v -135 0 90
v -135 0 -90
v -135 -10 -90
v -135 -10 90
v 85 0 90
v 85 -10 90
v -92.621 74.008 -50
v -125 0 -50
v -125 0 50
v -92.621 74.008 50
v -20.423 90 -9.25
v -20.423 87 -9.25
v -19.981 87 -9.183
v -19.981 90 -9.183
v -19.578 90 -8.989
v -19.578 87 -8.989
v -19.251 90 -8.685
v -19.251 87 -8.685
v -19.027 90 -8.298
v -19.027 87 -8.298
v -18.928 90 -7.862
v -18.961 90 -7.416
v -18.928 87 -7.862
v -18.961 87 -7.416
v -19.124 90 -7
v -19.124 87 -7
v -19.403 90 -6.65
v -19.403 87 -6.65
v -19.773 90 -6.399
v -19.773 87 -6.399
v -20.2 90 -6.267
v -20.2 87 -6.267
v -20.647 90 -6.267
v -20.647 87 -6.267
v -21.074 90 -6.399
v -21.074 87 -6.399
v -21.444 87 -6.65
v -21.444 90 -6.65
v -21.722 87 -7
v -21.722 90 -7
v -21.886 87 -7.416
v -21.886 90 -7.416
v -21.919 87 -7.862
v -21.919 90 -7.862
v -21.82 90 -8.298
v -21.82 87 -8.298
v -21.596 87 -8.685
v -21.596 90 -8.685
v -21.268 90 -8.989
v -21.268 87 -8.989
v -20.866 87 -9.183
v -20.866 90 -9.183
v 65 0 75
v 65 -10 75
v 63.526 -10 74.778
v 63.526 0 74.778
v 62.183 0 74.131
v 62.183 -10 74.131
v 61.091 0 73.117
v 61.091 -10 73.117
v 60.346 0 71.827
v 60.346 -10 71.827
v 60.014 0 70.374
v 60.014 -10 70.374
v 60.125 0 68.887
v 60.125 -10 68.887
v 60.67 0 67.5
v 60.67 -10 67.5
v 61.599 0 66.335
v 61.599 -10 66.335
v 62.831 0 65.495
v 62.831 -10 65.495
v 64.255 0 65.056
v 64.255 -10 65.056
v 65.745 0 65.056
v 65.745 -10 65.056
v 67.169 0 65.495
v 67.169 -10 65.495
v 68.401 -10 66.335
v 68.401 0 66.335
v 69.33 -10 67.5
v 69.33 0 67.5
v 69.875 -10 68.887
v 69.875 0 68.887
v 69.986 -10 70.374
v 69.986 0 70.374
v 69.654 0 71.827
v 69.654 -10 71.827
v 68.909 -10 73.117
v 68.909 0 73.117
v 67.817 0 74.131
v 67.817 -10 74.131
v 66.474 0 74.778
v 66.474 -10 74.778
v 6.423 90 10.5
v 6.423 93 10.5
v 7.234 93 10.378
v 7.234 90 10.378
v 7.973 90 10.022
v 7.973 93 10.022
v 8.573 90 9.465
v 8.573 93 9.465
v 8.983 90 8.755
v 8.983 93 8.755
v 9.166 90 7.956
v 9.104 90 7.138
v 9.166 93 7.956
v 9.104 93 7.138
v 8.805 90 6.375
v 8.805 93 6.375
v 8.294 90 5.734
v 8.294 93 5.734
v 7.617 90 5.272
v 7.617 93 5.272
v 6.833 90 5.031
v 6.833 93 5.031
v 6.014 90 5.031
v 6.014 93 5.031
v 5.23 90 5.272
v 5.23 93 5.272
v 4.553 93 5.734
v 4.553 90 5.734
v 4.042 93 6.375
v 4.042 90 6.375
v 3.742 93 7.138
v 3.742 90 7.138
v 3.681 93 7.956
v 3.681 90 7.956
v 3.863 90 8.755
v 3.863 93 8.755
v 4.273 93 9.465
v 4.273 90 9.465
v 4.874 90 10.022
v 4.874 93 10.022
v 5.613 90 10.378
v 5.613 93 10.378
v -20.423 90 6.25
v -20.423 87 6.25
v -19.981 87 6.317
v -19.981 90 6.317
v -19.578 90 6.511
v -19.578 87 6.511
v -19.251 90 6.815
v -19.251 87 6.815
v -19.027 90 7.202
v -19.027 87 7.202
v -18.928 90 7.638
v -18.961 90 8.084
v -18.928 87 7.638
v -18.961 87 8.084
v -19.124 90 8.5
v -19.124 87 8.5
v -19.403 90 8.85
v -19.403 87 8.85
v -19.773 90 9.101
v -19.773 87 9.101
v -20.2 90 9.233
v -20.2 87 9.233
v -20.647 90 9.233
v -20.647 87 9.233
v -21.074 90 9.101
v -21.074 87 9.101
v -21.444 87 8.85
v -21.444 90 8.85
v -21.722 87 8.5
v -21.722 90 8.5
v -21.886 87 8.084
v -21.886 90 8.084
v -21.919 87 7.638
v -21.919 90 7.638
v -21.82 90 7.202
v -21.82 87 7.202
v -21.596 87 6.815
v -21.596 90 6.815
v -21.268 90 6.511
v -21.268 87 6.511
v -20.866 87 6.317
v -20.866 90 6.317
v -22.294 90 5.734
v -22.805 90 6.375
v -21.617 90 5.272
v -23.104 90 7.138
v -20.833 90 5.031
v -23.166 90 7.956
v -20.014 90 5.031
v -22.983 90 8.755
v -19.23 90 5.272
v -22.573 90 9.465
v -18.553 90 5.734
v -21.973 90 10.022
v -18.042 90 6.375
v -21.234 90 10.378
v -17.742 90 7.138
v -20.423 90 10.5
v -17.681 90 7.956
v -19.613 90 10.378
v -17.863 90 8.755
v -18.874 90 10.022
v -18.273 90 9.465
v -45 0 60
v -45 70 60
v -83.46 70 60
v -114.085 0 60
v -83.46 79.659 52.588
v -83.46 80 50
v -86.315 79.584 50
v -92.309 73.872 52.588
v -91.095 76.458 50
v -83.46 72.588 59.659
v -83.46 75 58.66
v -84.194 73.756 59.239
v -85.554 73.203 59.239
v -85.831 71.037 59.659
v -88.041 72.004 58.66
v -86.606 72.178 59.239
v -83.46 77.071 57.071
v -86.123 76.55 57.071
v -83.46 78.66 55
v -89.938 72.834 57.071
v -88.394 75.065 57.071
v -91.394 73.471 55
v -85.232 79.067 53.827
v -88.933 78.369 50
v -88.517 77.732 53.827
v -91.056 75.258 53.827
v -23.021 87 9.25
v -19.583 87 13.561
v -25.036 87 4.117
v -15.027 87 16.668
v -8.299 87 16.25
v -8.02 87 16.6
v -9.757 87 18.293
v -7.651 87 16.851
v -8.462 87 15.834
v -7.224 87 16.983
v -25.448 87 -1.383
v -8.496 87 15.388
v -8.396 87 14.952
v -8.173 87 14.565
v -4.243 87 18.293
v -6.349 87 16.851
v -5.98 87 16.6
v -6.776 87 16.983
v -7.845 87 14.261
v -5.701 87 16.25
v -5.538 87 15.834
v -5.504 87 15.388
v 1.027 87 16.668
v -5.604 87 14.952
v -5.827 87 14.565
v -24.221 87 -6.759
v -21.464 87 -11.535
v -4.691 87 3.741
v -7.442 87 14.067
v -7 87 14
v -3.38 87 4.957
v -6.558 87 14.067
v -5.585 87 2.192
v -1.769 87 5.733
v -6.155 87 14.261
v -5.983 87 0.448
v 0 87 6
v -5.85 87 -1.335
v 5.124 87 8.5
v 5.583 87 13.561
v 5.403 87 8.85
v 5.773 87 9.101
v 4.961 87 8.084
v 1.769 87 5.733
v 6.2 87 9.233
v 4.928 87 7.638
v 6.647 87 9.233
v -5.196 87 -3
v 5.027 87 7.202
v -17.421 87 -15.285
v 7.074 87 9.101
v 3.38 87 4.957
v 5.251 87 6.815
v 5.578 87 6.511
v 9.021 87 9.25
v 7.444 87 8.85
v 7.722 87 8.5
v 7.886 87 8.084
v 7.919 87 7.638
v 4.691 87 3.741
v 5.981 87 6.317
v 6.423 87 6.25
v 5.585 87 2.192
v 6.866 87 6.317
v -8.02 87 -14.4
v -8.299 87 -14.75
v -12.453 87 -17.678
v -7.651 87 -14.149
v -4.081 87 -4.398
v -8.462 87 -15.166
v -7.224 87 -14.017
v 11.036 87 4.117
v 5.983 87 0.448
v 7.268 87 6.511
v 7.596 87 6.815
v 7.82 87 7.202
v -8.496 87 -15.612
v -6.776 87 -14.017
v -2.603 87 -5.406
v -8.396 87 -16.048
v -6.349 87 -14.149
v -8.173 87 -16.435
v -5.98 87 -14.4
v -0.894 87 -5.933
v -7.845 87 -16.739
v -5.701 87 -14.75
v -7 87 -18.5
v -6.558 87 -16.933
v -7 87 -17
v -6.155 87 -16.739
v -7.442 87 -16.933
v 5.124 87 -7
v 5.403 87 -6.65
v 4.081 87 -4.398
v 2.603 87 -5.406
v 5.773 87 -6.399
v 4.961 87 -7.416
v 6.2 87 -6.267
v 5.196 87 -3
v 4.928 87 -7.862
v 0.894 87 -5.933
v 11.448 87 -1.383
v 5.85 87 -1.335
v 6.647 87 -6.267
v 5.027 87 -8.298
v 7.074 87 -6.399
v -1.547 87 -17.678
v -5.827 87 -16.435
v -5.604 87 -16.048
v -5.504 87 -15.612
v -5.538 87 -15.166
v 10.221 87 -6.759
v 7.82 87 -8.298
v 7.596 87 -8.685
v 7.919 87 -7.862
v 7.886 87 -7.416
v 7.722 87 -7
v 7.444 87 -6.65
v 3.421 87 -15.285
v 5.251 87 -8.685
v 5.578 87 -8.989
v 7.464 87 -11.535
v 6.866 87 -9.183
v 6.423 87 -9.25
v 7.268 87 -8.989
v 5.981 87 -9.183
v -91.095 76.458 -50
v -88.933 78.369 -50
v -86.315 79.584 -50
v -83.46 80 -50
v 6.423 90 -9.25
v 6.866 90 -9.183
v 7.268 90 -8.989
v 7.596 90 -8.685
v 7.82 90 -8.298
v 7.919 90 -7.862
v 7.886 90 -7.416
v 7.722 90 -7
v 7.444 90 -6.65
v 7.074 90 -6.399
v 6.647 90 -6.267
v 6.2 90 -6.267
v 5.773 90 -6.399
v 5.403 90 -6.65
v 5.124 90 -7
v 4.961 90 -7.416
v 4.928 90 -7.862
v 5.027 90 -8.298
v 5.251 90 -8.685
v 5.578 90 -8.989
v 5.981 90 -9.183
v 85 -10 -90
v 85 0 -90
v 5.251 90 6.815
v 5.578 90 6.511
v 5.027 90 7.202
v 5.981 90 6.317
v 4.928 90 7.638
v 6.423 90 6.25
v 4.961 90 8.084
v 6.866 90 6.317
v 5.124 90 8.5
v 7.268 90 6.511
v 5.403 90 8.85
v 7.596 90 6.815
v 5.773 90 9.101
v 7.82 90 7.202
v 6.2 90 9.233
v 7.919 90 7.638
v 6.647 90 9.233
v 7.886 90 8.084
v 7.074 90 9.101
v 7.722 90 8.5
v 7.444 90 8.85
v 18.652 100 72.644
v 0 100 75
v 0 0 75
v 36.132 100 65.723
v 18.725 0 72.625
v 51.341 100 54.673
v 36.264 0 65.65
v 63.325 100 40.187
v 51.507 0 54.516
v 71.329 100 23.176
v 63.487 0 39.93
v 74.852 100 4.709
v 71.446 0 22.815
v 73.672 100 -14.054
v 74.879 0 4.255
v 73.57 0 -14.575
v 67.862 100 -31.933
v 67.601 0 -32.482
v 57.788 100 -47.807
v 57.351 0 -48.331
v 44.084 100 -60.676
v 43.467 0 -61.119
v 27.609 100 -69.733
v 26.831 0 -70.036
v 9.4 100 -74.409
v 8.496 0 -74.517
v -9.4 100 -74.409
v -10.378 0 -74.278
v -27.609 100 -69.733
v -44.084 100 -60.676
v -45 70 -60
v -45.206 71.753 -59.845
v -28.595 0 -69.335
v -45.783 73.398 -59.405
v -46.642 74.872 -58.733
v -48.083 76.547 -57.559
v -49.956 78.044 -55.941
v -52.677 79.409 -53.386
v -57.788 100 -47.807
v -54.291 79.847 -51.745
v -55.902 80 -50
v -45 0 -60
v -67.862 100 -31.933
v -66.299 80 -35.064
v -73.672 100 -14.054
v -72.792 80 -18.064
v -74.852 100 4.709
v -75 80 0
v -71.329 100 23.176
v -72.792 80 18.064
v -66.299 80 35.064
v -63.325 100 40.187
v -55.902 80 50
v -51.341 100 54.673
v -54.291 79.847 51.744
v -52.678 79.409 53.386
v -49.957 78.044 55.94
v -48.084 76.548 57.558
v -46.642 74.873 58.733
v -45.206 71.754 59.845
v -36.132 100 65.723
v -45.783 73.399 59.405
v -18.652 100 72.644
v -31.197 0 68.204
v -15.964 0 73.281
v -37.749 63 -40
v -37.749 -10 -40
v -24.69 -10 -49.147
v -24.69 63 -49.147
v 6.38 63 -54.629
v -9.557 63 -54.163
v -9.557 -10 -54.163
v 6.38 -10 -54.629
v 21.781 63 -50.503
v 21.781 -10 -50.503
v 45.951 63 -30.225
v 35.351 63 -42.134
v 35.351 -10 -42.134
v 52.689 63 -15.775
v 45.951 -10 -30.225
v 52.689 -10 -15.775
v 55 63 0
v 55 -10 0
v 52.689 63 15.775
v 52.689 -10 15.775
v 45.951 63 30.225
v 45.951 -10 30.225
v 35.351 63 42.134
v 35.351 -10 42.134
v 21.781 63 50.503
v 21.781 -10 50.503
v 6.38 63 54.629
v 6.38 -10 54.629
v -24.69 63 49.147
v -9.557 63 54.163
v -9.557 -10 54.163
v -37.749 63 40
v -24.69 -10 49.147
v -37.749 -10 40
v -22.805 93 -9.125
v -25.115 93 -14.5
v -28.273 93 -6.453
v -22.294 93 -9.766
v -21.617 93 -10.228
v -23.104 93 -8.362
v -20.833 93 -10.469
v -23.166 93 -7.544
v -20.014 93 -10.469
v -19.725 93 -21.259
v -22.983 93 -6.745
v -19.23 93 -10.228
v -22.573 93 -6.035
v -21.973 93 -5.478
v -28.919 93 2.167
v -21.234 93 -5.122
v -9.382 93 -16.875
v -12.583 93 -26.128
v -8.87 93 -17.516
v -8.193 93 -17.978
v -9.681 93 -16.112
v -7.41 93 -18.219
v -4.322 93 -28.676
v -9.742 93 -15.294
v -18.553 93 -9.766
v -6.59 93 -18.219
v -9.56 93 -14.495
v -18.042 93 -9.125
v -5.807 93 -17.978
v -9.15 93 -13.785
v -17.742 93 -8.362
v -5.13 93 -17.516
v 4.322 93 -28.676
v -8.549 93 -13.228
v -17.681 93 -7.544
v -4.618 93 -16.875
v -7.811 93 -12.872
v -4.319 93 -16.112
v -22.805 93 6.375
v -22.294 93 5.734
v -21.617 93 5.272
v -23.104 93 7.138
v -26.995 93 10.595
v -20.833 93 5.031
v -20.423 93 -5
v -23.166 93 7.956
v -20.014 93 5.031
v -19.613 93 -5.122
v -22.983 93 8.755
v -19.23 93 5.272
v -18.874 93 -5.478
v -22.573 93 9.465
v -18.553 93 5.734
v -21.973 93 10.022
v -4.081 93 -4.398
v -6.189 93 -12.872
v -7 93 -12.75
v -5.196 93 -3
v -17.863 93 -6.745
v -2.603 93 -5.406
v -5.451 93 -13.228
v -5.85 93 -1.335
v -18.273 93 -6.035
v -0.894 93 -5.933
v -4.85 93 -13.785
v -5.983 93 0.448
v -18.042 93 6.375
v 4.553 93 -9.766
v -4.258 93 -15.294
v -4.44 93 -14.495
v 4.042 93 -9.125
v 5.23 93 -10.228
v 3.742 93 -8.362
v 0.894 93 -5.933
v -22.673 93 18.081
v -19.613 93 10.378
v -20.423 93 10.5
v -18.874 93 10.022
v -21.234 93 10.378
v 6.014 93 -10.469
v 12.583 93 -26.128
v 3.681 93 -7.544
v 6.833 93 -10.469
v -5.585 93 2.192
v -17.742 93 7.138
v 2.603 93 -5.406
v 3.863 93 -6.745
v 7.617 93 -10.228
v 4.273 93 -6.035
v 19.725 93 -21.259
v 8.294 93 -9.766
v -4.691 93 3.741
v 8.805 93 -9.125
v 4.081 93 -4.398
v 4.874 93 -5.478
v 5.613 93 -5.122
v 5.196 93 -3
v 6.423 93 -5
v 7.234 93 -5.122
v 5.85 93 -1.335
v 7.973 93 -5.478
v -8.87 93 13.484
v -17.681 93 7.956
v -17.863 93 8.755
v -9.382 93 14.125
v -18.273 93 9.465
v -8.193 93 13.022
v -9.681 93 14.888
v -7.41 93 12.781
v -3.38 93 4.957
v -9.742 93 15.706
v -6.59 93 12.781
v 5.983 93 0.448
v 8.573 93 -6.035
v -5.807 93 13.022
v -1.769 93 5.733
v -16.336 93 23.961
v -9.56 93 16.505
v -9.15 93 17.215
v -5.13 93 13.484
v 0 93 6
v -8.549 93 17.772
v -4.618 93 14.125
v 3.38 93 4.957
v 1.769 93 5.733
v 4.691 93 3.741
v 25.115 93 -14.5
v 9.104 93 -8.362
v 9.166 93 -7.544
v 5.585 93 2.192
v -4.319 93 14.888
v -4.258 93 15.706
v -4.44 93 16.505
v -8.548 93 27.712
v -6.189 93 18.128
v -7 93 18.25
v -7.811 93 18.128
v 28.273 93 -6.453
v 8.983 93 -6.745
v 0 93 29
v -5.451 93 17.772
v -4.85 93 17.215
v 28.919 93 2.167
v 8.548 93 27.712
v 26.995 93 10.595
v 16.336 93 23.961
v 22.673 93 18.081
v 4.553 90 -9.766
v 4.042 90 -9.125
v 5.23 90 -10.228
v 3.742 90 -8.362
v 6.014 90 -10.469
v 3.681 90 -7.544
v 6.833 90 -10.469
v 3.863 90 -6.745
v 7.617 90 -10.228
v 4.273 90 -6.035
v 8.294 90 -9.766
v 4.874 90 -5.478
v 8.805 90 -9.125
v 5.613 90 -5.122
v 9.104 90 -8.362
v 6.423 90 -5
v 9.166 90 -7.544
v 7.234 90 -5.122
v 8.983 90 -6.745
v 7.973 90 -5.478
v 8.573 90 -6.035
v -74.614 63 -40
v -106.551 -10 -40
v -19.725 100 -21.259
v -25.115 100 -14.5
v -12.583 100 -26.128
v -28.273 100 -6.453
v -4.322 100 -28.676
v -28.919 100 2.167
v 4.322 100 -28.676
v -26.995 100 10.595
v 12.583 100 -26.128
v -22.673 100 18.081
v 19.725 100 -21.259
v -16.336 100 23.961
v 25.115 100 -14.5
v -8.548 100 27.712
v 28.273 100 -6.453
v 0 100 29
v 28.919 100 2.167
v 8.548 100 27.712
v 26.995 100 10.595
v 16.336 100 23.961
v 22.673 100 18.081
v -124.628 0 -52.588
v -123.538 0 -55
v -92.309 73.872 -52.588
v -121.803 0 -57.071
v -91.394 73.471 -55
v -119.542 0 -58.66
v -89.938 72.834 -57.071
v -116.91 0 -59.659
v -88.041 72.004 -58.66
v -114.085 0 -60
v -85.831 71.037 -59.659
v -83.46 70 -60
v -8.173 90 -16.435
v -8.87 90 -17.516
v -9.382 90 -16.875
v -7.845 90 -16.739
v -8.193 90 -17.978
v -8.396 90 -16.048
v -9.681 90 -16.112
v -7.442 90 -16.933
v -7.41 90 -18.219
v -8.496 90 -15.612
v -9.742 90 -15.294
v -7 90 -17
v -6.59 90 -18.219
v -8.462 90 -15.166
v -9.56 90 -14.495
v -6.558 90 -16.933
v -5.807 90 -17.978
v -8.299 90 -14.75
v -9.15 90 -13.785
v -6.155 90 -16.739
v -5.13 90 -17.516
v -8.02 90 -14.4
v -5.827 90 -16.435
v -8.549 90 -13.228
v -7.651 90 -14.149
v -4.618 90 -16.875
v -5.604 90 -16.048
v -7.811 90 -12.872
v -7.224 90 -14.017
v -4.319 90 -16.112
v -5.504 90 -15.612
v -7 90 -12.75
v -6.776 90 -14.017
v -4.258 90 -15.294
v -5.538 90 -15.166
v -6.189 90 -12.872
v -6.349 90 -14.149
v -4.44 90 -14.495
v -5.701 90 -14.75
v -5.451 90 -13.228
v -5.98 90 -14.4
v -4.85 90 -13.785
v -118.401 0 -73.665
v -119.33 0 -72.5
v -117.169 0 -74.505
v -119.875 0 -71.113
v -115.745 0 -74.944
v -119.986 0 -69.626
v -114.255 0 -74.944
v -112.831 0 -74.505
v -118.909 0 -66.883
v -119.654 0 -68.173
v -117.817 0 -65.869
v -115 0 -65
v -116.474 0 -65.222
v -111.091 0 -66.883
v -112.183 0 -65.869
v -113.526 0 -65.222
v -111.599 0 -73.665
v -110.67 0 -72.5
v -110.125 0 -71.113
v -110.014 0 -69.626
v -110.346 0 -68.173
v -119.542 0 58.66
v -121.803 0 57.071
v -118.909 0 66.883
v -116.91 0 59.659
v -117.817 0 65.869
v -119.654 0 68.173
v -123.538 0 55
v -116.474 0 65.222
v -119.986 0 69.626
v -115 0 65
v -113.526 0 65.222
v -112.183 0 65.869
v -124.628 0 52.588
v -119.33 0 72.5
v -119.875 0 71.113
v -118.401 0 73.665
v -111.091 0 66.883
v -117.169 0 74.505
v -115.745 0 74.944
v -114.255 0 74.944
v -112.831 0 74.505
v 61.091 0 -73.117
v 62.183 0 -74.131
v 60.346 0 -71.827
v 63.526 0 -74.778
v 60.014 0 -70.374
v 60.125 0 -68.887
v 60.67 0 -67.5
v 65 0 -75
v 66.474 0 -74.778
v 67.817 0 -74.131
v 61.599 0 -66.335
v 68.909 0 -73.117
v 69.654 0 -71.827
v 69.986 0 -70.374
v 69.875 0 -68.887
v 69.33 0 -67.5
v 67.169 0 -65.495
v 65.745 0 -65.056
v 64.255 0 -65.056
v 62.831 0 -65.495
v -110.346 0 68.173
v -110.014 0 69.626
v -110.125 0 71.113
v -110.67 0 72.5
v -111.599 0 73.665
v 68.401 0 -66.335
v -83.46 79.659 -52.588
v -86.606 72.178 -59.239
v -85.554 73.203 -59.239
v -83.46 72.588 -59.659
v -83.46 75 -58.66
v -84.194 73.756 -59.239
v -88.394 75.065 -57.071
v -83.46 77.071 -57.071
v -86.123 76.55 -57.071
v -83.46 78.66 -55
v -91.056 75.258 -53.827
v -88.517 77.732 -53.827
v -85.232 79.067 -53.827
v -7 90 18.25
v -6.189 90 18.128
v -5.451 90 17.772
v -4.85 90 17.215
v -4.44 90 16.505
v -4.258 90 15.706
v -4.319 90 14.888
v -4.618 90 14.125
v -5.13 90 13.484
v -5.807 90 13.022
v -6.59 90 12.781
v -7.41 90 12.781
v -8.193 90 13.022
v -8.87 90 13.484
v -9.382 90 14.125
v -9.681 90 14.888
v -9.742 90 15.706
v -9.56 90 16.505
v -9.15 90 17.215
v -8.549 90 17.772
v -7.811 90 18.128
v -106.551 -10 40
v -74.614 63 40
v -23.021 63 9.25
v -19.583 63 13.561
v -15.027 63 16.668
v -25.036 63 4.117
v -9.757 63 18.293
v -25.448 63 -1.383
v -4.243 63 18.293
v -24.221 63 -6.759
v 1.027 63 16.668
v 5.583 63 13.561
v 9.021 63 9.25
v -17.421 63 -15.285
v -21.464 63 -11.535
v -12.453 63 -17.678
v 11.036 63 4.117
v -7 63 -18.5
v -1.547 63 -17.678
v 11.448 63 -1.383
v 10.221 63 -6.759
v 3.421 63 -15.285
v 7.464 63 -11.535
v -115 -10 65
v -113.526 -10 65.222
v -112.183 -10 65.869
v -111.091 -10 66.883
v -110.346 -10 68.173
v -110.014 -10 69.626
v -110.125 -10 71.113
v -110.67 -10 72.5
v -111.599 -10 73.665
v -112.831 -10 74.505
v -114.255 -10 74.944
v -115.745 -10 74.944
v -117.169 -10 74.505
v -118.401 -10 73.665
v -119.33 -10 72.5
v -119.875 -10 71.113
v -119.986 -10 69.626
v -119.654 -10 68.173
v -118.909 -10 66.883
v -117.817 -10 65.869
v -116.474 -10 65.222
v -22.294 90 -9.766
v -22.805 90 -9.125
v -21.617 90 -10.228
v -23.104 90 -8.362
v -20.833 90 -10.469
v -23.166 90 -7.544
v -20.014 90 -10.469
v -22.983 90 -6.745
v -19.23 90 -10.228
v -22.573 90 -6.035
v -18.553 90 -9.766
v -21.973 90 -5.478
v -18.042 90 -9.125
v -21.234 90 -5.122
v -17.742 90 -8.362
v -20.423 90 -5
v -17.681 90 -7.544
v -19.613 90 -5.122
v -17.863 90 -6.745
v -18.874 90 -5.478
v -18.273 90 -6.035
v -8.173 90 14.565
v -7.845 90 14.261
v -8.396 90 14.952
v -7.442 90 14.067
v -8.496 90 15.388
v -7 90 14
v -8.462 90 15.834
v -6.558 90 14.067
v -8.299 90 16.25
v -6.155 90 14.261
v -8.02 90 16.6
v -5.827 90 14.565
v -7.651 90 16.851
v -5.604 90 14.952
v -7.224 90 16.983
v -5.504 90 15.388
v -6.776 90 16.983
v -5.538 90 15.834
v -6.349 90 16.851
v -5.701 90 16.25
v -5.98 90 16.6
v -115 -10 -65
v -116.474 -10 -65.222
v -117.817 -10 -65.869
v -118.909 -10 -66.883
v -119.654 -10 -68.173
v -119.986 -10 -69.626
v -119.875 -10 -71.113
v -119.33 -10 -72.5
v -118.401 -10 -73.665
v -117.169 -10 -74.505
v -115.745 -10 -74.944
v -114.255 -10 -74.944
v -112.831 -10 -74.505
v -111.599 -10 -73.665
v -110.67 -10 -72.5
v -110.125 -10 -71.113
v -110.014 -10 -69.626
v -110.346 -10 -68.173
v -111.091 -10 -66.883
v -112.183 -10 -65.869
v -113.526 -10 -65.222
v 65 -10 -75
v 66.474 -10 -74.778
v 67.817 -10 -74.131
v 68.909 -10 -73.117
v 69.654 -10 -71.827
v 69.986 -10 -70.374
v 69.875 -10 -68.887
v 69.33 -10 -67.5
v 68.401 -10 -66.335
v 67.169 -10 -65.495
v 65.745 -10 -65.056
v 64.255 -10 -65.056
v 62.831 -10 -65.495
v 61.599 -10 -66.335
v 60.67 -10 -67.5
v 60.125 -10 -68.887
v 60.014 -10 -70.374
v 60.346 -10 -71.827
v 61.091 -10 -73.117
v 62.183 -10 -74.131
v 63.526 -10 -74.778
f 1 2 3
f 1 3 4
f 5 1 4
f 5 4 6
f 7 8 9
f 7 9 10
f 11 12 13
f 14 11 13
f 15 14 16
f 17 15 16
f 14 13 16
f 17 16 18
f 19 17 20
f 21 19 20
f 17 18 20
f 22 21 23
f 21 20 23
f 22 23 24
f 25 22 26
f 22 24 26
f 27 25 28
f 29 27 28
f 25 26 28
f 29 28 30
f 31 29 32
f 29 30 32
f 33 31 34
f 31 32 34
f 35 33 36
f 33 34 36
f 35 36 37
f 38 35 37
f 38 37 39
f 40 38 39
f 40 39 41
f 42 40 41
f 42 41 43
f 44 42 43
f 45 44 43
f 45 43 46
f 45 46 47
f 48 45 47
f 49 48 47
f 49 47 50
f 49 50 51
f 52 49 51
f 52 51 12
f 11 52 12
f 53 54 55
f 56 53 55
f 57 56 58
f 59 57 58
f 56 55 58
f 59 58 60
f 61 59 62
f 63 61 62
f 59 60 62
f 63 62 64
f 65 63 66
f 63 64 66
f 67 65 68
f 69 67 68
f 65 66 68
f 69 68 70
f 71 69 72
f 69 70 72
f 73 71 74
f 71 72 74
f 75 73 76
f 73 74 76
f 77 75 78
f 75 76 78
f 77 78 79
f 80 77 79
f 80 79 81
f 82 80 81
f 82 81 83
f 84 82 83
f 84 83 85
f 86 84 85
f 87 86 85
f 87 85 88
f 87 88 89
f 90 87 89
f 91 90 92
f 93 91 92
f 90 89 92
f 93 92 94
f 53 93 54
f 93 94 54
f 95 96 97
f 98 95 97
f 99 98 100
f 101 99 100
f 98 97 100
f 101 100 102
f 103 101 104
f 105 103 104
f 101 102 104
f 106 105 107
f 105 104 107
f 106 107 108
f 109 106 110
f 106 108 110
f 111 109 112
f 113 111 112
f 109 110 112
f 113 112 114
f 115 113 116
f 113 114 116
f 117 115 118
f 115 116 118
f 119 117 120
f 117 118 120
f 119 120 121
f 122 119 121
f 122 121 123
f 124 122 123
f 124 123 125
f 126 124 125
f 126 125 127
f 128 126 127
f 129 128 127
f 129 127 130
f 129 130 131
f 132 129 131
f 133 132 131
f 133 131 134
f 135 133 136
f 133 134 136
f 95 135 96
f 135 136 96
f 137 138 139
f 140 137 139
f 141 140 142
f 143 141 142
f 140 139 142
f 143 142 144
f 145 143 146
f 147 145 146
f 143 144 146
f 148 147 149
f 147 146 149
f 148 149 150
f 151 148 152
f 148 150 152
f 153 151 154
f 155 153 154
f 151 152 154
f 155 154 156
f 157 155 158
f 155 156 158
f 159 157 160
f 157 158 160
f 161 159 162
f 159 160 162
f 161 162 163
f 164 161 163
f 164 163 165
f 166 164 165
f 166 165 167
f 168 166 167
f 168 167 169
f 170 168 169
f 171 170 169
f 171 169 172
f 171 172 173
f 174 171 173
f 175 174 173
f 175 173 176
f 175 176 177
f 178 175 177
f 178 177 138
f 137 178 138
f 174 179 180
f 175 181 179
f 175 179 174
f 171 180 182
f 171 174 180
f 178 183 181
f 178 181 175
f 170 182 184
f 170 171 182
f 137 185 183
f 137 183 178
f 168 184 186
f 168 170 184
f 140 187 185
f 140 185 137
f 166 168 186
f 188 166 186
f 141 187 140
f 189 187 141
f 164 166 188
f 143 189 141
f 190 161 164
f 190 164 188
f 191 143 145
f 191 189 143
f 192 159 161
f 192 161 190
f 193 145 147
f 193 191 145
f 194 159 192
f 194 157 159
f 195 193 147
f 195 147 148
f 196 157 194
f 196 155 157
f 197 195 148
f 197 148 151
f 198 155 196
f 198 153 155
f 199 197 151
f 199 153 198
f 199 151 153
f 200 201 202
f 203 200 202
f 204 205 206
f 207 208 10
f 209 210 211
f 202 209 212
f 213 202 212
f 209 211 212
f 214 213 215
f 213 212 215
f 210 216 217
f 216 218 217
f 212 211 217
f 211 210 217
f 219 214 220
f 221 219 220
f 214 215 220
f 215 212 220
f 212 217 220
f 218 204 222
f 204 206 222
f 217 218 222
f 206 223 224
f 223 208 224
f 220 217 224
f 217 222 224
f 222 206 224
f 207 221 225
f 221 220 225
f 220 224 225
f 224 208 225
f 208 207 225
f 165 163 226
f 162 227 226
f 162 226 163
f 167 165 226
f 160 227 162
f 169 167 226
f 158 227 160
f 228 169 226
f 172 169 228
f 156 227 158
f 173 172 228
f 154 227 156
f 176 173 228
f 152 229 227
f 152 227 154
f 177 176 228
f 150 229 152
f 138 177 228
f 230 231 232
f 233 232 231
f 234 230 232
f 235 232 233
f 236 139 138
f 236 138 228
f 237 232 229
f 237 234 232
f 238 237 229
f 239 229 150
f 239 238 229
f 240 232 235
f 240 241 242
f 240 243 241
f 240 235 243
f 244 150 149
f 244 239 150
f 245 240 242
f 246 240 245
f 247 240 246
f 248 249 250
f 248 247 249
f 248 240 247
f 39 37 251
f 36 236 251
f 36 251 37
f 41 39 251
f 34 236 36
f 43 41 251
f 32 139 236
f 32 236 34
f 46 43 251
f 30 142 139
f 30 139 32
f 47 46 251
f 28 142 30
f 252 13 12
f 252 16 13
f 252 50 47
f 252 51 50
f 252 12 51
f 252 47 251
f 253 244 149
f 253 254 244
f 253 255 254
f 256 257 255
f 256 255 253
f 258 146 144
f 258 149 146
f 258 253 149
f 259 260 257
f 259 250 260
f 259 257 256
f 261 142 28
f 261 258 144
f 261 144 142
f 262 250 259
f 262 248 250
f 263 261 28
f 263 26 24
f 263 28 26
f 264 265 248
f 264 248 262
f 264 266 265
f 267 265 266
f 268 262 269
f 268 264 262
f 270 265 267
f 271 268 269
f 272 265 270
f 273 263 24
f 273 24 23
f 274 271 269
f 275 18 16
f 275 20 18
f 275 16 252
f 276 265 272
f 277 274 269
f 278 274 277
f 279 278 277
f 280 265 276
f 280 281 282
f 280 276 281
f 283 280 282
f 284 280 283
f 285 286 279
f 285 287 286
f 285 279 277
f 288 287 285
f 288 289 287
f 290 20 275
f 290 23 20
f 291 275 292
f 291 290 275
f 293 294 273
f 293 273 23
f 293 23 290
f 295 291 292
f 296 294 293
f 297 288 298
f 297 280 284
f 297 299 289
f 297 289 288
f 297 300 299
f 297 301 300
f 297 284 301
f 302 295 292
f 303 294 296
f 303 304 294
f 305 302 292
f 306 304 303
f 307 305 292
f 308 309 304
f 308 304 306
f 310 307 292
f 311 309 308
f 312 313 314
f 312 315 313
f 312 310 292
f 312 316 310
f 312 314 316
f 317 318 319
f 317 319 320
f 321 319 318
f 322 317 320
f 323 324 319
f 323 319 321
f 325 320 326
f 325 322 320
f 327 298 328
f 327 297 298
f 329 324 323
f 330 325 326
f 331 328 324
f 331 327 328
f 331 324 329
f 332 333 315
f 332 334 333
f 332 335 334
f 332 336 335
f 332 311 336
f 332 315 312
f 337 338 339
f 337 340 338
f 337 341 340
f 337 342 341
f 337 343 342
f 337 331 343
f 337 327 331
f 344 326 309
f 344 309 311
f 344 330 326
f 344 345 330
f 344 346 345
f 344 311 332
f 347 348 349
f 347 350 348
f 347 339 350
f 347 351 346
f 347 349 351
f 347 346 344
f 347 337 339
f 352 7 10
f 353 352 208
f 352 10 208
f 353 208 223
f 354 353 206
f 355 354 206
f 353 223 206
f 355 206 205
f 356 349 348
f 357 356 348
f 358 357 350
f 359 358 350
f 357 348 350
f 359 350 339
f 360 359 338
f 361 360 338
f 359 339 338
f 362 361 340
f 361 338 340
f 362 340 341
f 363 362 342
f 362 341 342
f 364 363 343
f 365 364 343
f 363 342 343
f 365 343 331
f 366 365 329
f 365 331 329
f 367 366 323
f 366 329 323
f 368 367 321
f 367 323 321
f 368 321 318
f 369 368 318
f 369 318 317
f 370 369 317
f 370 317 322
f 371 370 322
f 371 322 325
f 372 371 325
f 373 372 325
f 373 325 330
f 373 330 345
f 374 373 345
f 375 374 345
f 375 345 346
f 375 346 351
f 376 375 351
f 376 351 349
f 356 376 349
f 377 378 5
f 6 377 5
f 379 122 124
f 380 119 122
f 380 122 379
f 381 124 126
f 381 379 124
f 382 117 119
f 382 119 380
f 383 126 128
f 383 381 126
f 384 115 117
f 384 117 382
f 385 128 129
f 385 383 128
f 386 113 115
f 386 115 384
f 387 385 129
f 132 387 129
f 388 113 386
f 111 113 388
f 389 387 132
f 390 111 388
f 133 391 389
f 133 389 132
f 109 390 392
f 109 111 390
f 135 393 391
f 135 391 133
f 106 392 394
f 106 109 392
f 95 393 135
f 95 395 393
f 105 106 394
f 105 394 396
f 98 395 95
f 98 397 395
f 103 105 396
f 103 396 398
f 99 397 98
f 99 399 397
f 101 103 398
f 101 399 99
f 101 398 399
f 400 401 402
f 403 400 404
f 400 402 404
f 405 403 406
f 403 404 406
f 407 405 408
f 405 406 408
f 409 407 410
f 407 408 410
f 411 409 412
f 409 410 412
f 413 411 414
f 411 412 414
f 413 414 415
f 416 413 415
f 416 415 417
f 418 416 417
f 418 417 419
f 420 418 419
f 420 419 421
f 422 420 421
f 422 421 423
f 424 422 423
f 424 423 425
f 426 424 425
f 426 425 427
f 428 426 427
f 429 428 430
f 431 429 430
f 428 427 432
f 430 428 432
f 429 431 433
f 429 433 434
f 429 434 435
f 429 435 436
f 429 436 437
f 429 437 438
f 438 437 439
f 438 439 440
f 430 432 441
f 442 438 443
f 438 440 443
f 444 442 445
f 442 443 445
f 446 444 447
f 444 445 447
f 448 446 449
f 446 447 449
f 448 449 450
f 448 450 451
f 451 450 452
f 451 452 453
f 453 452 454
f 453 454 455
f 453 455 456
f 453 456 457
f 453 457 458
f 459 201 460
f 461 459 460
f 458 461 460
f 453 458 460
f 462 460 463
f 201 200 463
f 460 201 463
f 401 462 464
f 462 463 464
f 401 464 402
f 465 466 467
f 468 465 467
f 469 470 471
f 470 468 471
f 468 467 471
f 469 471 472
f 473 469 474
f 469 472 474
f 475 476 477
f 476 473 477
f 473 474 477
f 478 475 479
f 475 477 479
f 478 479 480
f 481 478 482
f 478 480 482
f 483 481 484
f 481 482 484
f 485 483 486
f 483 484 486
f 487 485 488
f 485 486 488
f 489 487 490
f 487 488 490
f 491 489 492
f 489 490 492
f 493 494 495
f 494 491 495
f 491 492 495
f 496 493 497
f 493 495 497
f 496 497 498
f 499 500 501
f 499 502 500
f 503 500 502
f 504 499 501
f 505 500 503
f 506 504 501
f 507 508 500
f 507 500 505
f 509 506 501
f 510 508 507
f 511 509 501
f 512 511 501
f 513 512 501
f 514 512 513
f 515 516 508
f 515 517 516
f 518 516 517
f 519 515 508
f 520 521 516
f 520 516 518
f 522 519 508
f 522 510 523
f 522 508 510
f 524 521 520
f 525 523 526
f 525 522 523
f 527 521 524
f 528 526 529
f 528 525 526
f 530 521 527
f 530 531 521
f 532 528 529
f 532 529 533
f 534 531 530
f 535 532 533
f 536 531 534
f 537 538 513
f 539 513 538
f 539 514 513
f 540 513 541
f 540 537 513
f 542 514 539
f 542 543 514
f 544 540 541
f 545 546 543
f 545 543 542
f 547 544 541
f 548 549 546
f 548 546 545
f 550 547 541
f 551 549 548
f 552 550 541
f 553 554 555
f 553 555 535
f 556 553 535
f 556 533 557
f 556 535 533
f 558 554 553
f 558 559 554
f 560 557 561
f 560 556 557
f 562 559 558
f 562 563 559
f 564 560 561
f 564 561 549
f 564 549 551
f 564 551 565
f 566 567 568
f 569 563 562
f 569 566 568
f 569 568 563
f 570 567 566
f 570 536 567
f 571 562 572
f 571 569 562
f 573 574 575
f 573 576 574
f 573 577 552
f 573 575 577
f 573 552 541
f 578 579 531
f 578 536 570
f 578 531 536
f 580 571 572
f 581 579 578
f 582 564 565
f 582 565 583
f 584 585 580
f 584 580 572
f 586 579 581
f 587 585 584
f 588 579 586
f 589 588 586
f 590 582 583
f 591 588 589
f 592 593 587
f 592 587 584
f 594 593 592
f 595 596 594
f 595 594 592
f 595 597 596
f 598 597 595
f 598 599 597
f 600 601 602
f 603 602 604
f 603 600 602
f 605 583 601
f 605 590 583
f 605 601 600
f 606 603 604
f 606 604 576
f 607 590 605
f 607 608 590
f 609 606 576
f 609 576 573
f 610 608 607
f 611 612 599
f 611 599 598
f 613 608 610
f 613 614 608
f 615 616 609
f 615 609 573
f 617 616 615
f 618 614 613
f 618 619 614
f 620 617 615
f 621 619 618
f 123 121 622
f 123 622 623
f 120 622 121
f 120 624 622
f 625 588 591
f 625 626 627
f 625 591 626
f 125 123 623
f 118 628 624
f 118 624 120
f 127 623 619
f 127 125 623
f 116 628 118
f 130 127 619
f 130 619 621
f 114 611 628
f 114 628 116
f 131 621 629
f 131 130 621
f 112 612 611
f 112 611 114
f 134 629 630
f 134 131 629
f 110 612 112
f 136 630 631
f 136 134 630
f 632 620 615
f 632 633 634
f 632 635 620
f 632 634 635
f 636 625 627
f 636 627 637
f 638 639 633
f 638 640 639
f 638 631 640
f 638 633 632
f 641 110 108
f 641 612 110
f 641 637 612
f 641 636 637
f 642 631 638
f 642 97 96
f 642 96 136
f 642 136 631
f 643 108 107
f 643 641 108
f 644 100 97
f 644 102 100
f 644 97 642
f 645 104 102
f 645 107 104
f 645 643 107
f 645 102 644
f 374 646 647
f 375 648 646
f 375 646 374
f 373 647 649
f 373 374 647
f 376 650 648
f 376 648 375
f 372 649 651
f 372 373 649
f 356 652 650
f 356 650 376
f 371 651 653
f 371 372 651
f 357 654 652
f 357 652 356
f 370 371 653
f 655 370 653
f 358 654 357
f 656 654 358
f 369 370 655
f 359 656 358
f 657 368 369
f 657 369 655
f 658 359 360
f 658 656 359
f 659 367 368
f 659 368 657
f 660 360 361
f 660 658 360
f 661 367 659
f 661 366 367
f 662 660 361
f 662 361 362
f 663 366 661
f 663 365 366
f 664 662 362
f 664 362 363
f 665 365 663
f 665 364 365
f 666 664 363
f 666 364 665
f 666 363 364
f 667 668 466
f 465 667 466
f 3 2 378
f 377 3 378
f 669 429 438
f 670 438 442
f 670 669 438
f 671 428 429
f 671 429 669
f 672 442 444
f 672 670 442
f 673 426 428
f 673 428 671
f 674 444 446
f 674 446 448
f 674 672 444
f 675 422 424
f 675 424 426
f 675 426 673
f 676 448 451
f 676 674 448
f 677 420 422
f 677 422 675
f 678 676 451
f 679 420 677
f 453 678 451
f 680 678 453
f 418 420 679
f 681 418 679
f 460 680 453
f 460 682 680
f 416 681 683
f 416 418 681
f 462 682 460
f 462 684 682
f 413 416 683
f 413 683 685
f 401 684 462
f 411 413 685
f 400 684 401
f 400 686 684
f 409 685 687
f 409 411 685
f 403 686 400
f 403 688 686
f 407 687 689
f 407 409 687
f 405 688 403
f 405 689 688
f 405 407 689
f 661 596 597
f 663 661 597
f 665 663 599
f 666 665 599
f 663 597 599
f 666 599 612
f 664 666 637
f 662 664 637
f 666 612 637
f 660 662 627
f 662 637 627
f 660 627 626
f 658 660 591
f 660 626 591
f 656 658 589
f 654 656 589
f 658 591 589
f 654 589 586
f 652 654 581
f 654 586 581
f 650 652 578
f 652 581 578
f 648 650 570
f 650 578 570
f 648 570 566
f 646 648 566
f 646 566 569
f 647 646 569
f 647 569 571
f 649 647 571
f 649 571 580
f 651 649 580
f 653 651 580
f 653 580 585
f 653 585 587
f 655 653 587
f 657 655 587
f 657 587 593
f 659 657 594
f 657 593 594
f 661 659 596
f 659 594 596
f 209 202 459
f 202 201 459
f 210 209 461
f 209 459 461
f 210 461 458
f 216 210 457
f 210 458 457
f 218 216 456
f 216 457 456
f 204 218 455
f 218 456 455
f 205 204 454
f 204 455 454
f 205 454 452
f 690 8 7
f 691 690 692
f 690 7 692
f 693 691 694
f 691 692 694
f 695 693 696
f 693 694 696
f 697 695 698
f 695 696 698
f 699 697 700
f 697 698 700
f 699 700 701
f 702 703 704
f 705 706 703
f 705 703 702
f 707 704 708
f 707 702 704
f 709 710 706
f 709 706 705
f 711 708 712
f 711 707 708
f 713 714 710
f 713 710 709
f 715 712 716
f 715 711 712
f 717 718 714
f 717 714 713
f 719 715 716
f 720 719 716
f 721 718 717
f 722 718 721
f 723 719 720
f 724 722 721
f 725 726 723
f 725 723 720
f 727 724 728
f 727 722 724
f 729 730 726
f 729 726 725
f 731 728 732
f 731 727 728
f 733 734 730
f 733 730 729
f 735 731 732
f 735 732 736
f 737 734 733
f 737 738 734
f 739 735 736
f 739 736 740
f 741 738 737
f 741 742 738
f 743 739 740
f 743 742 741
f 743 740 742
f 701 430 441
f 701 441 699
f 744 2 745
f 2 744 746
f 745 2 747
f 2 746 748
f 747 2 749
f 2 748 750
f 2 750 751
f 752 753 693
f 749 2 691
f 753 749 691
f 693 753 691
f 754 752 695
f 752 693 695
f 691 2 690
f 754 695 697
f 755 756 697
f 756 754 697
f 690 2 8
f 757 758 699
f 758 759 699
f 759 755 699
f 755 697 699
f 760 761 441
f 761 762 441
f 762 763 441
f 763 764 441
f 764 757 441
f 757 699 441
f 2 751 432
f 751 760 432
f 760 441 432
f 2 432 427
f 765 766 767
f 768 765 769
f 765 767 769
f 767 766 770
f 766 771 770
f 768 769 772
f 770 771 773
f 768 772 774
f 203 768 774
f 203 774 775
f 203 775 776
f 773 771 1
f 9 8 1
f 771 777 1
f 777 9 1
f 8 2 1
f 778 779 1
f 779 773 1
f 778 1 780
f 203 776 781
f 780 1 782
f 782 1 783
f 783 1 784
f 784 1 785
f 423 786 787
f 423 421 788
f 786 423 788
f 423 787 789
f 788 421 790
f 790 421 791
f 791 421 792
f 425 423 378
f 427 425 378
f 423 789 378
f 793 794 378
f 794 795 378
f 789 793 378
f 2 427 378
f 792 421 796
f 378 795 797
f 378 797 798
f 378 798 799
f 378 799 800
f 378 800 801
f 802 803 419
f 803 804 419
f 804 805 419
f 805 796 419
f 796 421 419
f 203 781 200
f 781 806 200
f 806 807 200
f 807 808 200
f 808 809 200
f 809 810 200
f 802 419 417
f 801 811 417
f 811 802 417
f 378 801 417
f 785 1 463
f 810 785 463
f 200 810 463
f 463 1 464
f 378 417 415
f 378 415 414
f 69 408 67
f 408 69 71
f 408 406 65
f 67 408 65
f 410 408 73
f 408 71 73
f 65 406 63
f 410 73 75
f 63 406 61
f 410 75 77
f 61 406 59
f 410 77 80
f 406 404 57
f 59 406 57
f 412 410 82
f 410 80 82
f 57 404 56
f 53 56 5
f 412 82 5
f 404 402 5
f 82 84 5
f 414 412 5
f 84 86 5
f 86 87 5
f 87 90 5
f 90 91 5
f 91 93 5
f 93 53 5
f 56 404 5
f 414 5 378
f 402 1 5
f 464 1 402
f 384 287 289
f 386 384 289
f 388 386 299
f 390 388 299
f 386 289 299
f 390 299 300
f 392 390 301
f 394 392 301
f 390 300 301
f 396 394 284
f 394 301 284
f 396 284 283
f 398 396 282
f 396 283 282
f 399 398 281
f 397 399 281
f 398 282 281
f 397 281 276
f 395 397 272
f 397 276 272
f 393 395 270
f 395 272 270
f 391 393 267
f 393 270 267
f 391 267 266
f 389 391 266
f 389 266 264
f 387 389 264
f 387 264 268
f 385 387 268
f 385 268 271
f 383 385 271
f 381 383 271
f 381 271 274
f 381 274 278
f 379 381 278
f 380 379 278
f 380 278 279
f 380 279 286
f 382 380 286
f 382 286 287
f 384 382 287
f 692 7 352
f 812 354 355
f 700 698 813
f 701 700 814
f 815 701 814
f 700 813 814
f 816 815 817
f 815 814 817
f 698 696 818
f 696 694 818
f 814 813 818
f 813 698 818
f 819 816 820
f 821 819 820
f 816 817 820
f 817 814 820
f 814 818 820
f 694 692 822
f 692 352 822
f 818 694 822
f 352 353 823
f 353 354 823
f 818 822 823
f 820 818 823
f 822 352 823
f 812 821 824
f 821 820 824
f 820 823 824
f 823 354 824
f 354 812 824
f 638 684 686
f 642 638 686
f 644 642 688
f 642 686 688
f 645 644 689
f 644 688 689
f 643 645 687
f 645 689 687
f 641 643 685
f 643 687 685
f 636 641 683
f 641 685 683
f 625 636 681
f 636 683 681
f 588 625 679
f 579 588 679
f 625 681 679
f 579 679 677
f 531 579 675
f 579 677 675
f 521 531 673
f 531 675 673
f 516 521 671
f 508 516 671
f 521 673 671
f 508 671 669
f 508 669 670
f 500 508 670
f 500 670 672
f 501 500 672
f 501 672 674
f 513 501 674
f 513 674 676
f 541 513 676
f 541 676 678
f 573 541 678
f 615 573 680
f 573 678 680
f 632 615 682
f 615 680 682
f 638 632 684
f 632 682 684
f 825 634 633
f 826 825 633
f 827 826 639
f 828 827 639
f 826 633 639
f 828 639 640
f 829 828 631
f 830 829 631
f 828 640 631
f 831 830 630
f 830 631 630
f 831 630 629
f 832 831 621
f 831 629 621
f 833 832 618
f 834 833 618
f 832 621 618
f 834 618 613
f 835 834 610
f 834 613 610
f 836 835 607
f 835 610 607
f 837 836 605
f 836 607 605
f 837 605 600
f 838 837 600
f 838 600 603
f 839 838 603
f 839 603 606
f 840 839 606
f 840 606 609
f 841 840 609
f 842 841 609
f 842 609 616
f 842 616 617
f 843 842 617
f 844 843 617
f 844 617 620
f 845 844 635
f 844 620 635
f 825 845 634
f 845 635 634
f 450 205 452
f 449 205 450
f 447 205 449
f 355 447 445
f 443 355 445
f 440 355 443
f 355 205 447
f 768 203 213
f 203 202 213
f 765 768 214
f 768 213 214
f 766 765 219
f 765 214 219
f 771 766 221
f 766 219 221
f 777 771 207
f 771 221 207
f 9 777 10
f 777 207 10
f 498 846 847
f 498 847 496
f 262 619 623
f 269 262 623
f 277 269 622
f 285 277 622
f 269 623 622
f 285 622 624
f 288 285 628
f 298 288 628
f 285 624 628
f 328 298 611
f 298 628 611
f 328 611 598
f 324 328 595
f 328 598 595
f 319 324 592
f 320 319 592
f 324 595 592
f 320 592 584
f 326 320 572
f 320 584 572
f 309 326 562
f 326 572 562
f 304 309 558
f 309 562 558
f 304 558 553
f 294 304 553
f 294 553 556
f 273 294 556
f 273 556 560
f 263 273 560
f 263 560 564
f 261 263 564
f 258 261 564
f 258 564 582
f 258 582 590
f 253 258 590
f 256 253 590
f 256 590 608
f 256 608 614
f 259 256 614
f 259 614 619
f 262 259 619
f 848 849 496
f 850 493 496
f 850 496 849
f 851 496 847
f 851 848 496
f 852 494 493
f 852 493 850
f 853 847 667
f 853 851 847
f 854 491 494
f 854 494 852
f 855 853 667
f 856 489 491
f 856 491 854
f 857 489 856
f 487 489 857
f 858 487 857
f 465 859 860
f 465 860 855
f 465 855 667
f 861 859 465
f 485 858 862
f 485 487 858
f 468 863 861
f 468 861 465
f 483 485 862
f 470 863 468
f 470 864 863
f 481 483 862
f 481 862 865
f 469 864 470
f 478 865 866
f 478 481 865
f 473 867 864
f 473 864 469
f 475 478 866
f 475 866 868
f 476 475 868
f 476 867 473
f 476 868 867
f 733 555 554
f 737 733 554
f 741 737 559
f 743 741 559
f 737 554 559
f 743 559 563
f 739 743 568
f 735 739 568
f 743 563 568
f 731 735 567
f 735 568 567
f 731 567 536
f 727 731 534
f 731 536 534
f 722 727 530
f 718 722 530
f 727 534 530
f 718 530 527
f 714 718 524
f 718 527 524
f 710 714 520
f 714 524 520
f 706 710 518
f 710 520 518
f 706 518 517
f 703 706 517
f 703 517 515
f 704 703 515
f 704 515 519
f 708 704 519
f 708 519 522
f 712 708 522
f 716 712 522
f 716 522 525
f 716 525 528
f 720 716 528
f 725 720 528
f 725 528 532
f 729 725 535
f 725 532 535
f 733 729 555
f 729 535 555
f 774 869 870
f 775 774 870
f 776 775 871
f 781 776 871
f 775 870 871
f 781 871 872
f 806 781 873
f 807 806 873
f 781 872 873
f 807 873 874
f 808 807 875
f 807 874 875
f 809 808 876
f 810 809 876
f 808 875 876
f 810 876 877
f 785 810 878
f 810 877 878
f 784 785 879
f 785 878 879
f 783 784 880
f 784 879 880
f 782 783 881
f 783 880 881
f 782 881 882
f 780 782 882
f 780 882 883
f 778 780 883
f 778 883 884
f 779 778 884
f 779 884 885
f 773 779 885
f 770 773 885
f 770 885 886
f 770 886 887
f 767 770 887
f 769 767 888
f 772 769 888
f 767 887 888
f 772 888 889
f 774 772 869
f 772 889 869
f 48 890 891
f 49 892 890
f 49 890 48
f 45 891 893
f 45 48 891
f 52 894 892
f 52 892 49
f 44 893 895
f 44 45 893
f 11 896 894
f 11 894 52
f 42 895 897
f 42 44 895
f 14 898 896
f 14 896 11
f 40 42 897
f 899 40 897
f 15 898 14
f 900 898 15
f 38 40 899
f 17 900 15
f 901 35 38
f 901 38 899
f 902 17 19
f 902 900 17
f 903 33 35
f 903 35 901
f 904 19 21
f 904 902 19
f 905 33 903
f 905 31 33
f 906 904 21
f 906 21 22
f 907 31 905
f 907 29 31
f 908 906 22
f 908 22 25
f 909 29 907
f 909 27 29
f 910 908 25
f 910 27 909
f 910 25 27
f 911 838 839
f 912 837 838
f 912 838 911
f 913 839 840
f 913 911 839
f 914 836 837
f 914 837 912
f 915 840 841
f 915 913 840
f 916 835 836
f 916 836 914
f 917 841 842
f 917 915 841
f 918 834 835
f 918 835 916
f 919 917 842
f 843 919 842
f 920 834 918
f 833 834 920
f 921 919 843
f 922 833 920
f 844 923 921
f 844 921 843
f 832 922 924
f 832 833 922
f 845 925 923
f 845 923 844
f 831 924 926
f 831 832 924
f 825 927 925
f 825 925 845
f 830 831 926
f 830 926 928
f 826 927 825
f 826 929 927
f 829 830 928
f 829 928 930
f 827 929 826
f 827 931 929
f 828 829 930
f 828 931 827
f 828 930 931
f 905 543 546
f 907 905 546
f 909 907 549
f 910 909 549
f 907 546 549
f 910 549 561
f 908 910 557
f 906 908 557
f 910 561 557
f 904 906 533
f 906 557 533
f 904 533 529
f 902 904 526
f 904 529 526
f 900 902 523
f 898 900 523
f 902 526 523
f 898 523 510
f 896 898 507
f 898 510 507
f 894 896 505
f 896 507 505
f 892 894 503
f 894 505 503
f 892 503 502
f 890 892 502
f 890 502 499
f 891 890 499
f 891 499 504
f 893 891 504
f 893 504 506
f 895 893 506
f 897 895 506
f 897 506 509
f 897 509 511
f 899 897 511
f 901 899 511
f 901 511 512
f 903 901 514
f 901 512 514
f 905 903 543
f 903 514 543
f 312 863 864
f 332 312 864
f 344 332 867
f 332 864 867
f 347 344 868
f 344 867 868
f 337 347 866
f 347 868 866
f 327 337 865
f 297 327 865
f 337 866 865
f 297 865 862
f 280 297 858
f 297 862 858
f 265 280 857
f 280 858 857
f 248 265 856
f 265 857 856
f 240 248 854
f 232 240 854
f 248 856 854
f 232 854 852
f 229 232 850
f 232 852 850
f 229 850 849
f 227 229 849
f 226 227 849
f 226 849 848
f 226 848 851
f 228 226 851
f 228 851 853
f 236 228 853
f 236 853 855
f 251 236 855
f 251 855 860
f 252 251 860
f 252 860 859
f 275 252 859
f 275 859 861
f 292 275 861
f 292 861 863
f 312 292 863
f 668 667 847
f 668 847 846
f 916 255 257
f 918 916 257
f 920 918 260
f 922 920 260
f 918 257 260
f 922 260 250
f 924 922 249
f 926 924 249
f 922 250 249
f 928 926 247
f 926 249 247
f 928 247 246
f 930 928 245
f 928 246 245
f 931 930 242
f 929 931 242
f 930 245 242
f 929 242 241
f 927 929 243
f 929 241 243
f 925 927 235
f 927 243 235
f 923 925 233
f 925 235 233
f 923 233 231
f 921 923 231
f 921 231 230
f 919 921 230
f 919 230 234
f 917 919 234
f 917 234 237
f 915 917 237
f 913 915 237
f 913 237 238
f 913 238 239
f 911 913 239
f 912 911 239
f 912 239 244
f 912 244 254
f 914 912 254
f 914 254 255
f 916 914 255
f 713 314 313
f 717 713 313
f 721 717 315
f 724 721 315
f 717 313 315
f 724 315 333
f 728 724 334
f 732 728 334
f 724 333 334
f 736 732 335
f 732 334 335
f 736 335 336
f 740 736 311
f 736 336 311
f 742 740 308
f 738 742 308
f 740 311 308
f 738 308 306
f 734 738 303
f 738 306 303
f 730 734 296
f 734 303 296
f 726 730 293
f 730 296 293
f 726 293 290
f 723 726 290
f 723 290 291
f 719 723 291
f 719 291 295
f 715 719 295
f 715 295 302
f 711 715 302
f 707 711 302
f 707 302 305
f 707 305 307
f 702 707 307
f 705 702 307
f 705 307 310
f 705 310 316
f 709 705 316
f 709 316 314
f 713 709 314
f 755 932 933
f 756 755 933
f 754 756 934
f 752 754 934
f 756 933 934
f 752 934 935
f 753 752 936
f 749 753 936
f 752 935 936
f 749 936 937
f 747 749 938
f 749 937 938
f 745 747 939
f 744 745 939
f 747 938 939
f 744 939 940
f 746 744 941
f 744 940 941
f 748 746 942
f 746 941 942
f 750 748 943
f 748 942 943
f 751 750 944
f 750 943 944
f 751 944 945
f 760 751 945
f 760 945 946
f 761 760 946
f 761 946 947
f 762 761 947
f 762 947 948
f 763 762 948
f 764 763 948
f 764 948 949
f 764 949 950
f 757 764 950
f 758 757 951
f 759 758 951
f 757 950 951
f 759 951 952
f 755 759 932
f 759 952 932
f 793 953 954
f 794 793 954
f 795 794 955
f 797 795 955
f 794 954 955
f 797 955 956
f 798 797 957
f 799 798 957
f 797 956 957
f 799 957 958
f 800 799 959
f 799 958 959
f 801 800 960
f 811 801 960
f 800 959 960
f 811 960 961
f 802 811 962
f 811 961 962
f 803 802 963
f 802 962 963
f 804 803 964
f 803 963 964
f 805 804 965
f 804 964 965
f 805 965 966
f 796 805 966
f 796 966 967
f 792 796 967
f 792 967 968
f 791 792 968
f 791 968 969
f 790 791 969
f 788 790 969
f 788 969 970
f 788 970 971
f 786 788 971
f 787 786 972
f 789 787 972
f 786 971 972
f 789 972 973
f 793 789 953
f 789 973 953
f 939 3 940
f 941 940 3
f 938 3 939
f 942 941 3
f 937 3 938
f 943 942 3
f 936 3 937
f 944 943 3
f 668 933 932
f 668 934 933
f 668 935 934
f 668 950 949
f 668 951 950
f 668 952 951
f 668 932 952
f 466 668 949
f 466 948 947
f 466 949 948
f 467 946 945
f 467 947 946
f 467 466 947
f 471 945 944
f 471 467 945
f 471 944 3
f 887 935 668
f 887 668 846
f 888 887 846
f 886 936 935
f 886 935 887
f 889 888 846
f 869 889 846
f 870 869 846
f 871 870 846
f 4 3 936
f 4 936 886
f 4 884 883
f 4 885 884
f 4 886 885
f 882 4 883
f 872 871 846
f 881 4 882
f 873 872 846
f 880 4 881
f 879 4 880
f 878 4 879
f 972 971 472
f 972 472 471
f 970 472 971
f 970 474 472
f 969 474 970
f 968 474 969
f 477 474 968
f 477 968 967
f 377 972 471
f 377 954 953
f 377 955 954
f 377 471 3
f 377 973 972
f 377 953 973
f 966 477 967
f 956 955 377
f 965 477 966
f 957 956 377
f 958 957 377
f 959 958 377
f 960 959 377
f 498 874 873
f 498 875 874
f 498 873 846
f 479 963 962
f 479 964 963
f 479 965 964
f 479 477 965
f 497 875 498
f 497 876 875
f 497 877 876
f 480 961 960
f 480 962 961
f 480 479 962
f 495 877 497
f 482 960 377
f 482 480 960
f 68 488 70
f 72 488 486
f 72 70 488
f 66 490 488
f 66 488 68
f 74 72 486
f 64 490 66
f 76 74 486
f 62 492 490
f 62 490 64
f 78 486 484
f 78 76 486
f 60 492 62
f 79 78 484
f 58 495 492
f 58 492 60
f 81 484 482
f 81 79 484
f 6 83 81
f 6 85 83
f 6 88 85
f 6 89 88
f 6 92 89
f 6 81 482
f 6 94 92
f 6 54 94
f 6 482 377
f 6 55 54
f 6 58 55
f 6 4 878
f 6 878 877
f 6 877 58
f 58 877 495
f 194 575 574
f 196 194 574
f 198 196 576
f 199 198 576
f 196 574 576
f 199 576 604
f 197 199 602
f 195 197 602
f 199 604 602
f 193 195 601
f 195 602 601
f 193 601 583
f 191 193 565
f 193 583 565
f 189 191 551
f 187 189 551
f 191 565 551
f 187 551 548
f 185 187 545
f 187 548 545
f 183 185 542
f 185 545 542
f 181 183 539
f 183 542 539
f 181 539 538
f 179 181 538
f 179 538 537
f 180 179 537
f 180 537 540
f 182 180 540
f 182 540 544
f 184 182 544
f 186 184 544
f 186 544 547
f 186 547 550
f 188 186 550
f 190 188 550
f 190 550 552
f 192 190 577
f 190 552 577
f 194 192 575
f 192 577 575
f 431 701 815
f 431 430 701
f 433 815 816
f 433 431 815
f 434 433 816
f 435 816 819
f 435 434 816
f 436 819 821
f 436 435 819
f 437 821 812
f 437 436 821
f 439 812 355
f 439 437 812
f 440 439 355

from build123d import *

# Parameters (mm, degrees)
SKETCH1_R                = 75
BOSS_EXTRUDE1_DEPTH      = 100
SKETCH5_R                = 29
CUT_EXTRUDE2_DEPTH       = 7
BOSS_EXTRUDE2_DEPTH      = 60
BOSS_EXTRUDE2_DEPTH_BACK = 60
SKETCH8_W                = 220
SKETCH8_H                = 180
BOSS_EXTRUDE3_DEPTH      = 10
SKETCH9_R                = 5
CUT_EXTRUDE4_DEPTH       = 10
FILLET1_R                = 10
SKETCH14_R               = 6
CUT_EXTRUDE6_DEPTH       = 110
SKETCH15_R               = 18.5
CUT_EXTRUDE7_DEPTH       = 97
SKETCH16_R               = 1.5
CUT_EXTRUDE8_DEPTH       = 7
SKETCH17_R               = 55
CUT_EXTRUDE9_DEPTH       = 73
SKETCH21_W               = 60
SKETCH21_H               = 80
CUT_EXTRUDE10_DEPTH      = 73
SKETCH23_R               = 2.75
CUT_EXTRUDE11_DEPTH      = 3
CUT_EXTRUDE15_DEPTH      = 40
CUT_EXTRUDE15_DEPTH_BACK = 40


with BuildPart() as part:
    # Sketch1 → Boss-Extrude1 (new body)
    with BuildSketch(Plane(origin=(0, 0, 0), x_dir=(1, 0, 0), z_dir=(0, 1, 0))):
        Circle(SKETCH1_R)
    extrude(amount=BOSS_EXTRUDE1_DEPTH)

    # Sketch5 → Cut-Extrude2 (cut)
    with BuildSketch(Plane(origin=(0, 100, 0), x_dir=(1, 0, 0), z_dir=(0, 1, 0))):
        Circle(SKETCH5_R)
    extrude(amount=-CUT_EXTRUDE2_DEPTH, mode=Mode.SUBTRACT)

    # Sketch2 → Boss-Extrude2 (add, two sides: drawn at the far end of the back side and taken through both)
    with BuildSketch(Plane.XY.offset(-BOSS_EXTRUDE2_DEPTH_BACK)):
        Polygon((0, 0), (-125, 0), (-90, 80), (0, 80), align=None)
    extrude(amount=BOSS_EXTRUDE2_DEPTH + BOSS_EXTRUDE2_DEPTH_BACK)

    # Sketch8 → Boss-Extrude3 (add)
    with BuildSketch(Plane.XZ):
        with Locations((-25, 0)):
            Rectangle(SKETCH8_W, SKETCH8_H)
    extrude(amount=BOSS_EXTRUDE3_DEPTH)

    # Sketch9 → Cut-Extrude4 (cut)
    with BuildSketch(Plane.XZ.offset(10)):
        with Locations((-115, 70)):
            Circle(SKETCH9_R)
        with Locations((65, 70)):
            Circle(SKETCH9_R)
        with Locations((65, -70)):
            Circle(SKETCH9_R)
        with Locations((-115, -70)):
            Circle(SKETCH9_R)
    extrude(amount=-CUT_EXTRUDE4_DEPTH, mode=Mode.SUBTRACT)

    # Fillet1
    fillet1_edges = [part.edges().sort_by_distance(p)[0] for p in [
        (-107.5, 40, 60),
        (-67.5, 80, 60),
        (-90, 80, 0),
        (-107.5, 40, -60),
        (-67.5, 80, -60),
    ]]
    fillet(fillet1_edges, radius=FILLET1_R)

    # Sketch14 → Cut-Extrude6 (cut)
    with BuildSketch(Plane(origin=(0, 93, 0), x_dir=(1, 0, 0), z_dir=(0, 1, 0))):
        Circle(SKETCH14_R)
    extrude(amount=-CUT_EXTRUDE6_DEPTH, mode=Mode.SUBTRACT)

    # Sketch15 → Cut-Extrude7 (cut)
    with BuildSketch(Plane.XZ.offset(10)):
        with Locations((-7, 0)):
            Circle(SKETCH15_R)
    extrude(amount=-CUT_EXTRUDE7_DEPTH, mode=Mode.SUBTRACT)

    # Sketch16 → Cut-Extrude8 (cut)
    with BuildSketch(Plane.XZ.offset(-87)):
        with Locations((-7, 15.5)):
            Circle(SKETCH16_R)
        with Locations((6.423393759, 7.75)):
            Circle(SKETCH16_R)
        with Locations((6.423393759, -7.75)):
            Circle(SKETCH16_R)
        with Locations((-7, -15.5)):
            Circle(SKETCH16_R)
        with Locations((-20.423393759, -7.75)):
            Circle(SKETCH16_R)
        with Locations((-20.423393759, 7.75)):
            Circle(SKETCH16_R)
    extrude(amount=-CUT_EXTRUDE8_DEPTH, mode=Mode.SUBTRACT)

    # Sketch17 → Cut-Extrude9 (cut)
    with BuildSketch(Plane.XZ.offset(10)):
        Circle(SKETCH17_R)
    extrude(amount=-CUT_EXTRUDE9_DEPTH, mode=Mode.SUBTRACT)

    # Sketch21 → Cut-Extrude10 (cut)
    with BuildSketch(Plane.XZ.offset(10)):
        with Locations((-30, 0)):
            Rectangle(SKETCH21_W, SKETCH21_H)
    extrude(amount=-CUT_EXTRUDE10_DEPTH, mode=Mode.SUBTRACT)

    # Sketch23 → Cut-Extrude11 (cut)
    with BuildSketch(Plane(origin=(0, 93, 0), x_dir=(1, 0, 0), z_dir=(0, 1, 0))):
        with Locations((-7, 15.5)):
            Circle(SKETCH23_R)
        with Locations((6.423393759, 7.75)):
            Circle(SKETCH23_R)
        with Locations((6.423393759, -7.75)):
            Circle(SKETCH23_R)
        with Locations((-7, -15.5)):
            Circle(SKETCH23_R)
        with Locations((-20.423393759, -7.75)):
            Circle(SKETCH23_R)
        with Locations((-20.423393759, 7.75)):
            Circle(SKETCH23_R)
    extrude(amount=-CUT_EXTRUDE11_DEPTH, mode=Mode.SUBTRACT)

    # Sketch27 → Cut-Extrude15 (cut, two sides: drawn at the far end of the back side and taken through both)
    with BuildSketch(Plane.XY.offset(-CUT_EXTRUDE15_DEPTH_BACK)):
        Polygon((-25, -10), (-25, 63), (-74.613551793, 63), (-106.551051793, -10), align=None)
    extrude(amount=CUT_EXTRUDE15_DEPTH + CUT_EXTRUDE15_DEPTH_BACK, mode=Mode.SUBTRACT)


solid = part.part
